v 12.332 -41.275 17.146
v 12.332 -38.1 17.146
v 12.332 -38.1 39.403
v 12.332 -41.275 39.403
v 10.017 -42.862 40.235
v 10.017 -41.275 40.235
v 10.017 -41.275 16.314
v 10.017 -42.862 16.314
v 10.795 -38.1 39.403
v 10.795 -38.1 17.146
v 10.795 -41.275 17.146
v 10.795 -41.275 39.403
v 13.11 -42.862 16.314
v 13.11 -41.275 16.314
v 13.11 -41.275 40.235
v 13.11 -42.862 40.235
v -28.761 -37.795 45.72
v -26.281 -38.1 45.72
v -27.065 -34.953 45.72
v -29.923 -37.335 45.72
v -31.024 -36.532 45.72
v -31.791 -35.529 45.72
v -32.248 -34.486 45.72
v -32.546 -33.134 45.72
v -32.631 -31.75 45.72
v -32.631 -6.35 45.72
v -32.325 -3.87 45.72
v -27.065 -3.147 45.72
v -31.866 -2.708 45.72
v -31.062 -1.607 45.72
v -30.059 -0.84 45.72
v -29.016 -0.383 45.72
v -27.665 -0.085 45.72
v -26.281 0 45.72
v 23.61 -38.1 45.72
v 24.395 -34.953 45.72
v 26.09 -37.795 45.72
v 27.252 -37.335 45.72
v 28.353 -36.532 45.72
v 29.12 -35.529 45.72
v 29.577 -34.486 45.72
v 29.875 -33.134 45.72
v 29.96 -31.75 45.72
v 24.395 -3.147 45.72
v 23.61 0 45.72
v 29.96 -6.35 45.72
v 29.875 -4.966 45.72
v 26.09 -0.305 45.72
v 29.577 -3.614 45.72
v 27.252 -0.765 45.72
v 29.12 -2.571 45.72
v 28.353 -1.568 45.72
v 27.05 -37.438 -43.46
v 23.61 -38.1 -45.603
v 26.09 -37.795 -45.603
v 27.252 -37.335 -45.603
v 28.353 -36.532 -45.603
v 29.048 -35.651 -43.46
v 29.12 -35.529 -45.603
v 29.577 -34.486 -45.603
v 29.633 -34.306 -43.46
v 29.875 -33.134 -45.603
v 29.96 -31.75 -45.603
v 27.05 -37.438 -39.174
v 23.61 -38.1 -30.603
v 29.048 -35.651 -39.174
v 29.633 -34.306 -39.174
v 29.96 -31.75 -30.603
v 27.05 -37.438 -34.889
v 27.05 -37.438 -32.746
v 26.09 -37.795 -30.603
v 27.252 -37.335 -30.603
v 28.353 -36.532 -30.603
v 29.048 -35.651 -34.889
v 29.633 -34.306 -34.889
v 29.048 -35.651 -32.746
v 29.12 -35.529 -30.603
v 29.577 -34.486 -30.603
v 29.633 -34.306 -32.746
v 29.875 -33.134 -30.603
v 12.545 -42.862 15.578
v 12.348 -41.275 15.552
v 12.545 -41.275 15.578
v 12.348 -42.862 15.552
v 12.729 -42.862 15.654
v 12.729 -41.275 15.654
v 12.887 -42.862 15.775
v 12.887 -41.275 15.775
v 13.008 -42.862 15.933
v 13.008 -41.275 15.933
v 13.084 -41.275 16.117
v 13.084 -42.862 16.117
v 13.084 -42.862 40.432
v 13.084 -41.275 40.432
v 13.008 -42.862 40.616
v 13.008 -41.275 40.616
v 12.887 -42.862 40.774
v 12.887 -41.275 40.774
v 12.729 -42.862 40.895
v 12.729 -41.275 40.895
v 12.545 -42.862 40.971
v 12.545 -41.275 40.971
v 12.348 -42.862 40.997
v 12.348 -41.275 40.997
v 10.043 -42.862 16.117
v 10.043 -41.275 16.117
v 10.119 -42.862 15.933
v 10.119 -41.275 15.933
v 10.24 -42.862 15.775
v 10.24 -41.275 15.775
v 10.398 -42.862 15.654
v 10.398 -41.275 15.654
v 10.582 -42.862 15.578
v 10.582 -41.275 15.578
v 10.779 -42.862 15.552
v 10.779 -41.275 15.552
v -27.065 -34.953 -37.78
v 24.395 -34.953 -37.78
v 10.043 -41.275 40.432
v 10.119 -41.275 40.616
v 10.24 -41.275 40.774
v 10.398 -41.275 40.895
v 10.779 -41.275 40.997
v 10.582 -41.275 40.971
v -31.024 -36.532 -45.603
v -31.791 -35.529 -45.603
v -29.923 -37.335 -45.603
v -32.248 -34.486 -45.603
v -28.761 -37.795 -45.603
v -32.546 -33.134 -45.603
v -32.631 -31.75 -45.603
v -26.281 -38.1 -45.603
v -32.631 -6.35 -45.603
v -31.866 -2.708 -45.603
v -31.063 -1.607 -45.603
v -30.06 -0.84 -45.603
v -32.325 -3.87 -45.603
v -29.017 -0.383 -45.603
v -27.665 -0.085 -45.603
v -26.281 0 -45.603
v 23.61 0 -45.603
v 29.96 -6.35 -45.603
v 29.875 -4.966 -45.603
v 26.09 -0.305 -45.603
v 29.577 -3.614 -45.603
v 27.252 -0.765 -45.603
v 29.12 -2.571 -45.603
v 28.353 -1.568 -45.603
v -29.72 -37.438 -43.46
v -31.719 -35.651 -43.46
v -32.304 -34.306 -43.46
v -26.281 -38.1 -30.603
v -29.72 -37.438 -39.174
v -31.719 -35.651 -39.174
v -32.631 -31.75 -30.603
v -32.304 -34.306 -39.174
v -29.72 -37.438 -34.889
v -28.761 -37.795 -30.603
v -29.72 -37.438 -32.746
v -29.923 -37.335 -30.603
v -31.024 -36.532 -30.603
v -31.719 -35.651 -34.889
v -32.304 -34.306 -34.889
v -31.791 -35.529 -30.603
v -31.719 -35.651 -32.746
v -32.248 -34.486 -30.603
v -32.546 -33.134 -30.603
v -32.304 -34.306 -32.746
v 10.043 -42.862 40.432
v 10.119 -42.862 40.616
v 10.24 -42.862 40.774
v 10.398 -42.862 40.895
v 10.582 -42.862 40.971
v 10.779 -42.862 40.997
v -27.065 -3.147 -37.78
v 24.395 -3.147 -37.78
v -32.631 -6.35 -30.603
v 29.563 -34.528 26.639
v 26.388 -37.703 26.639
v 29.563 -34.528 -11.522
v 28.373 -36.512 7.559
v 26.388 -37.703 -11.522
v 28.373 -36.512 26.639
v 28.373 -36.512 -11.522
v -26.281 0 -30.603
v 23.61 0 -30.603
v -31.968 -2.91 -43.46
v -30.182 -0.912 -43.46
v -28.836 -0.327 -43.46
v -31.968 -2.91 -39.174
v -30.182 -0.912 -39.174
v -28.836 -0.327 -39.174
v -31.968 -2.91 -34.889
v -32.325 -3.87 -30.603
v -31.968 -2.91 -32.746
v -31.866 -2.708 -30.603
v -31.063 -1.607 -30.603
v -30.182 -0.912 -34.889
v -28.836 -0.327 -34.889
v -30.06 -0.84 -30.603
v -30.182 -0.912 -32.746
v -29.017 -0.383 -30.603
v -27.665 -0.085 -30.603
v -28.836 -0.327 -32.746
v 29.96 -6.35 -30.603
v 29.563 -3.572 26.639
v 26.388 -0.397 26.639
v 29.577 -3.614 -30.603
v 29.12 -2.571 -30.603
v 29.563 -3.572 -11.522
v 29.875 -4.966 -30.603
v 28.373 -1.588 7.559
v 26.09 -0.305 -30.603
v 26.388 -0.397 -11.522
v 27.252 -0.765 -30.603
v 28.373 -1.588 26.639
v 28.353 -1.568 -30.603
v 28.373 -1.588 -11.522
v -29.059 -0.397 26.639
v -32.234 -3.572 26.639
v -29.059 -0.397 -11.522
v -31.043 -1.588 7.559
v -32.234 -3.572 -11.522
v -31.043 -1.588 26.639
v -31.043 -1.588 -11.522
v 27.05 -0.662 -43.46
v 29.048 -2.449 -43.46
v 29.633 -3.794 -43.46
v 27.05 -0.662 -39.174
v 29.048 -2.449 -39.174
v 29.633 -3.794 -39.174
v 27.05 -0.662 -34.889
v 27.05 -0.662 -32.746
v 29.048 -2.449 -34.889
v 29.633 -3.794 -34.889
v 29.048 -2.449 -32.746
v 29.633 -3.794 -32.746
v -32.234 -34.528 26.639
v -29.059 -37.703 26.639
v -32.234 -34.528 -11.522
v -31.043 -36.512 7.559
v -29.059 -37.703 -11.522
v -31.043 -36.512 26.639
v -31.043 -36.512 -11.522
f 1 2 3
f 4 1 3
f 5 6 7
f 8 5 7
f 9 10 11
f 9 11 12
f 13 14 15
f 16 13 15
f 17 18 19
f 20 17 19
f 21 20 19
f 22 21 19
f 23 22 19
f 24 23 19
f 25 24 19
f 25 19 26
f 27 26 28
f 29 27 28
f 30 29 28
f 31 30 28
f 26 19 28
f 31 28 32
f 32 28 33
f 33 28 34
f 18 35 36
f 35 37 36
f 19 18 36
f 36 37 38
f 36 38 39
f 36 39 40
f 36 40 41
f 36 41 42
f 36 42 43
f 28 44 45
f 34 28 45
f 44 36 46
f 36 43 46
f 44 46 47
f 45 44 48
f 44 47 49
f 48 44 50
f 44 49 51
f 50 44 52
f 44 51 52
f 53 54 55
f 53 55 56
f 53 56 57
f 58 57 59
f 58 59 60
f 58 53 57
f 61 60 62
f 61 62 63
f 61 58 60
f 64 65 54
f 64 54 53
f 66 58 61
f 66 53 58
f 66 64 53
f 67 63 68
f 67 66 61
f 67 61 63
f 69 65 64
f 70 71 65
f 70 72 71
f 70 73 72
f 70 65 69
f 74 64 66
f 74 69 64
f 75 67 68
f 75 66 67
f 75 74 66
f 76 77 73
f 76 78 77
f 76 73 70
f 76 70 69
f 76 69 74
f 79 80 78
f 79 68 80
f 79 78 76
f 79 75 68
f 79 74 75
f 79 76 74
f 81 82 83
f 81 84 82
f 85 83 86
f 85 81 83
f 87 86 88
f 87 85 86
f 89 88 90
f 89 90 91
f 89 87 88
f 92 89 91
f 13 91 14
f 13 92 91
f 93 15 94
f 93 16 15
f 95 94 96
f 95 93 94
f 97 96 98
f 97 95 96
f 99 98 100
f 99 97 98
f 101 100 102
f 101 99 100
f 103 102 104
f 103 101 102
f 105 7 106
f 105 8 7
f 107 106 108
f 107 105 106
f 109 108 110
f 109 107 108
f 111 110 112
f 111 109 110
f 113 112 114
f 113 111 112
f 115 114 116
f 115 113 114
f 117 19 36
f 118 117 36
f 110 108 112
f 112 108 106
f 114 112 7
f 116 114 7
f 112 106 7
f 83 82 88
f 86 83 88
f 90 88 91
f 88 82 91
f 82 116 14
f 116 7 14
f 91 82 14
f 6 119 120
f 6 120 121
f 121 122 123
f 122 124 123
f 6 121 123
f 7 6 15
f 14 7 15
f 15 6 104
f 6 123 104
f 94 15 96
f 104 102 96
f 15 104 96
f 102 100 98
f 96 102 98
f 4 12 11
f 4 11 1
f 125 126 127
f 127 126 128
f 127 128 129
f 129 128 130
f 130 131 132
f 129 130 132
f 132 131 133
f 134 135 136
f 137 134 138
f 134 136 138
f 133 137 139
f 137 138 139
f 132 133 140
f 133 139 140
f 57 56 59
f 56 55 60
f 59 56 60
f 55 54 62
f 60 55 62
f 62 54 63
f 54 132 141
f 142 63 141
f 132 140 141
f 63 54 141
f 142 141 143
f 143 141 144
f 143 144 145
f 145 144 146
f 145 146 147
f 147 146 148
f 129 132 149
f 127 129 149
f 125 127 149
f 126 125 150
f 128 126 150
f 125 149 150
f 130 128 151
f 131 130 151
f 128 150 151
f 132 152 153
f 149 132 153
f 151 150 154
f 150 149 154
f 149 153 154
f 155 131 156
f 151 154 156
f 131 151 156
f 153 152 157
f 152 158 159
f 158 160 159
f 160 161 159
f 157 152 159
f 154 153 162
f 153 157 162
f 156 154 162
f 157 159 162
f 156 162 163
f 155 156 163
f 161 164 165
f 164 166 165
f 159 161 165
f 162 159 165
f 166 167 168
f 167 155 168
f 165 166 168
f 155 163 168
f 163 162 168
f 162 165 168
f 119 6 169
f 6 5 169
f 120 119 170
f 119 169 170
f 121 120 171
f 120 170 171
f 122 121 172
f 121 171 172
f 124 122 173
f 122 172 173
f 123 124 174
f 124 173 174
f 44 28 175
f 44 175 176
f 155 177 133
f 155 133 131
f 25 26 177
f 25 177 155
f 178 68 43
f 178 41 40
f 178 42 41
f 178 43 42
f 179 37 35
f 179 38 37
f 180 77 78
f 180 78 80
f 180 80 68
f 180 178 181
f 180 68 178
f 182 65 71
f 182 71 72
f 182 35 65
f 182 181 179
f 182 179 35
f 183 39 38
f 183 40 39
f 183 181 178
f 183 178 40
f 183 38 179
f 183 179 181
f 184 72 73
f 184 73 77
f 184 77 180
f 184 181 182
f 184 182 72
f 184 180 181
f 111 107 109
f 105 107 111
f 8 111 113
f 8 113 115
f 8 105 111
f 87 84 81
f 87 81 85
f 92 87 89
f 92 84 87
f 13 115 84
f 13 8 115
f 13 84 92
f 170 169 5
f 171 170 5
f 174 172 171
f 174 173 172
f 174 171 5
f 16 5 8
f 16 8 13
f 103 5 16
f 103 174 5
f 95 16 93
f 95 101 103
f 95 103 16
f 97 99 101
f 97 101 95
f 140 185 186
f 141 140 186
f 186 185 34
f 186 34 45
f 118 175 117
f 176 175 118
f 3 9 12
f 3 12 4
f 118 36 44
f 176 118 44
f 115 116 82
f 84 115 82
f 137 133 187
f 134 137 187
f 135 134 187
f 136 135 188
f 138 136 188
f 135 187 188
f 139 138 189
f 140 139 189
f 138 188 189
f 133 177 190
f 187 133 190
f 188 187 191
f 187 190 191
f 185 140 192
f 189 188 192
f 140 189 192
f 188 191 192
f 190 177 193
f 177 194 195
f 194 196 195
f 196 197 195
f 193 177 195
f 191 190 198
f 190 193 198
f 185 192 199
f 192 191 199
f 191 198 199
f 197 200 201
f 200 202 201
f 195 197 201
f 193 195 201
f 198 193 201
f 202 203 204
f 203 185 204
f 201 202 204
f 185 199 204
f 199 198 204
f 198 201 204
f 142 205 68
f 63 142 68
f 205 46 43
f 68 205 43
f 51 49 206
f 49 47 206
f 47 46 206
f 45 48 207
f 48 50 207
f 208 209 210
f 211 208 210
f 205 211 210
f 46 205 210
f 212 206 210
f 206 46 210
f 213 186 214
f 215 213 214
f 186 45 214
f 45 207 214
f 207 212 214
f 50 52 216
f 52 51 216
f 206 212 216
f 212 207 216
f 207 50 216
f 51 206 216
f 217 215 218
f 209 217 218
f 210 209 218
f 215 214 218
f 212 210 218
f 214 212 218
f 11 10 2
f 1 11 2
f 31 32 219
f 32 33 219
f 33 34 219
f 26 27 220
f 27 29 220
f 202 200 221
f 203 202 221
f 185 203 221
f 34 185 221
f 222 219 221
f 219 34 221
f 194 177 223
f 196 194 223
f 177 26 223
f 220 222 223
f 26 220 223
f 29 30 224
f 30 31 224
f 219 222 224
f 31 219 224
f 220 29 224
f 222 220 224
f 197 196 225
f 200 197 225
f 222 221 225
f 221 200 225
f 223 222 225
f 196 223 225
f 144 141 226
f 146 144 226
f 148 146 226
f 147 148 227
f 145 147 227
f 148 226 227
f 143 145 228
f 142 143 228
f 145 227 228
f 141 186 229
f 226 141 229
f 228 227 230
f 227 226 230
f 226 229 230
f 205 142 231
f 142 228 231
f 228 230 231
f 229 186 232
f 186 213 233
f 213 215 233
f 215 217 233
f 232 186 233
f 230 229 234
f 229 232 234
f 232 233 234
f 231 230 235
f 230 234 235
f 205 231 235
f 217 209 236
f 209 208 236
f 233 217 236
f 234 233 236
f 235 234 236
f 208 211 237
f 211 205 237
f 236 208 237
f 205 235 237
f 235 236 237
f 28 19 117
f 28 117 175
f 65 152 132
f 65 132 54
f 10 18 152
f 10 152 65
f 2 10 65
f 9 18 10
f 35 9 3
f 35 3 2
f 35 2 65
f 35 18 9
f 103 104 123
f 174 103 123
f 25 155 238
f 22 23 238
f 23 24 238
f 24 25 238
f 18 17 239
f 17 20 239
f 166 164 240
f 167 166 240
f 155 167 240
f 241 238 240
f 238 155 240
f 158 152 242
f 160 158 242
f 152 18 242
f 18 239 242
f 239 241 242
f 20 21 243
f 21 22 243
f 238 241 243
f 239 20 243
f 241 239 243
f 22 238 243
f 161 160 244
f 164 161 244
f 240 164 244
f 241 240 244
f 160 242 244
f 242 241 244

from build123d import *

# Parameters (mm, degrees)
F0_W         = 82.5909674168
F0_H         = 76.3229075819
F1_DEPTH     = 25.4
F2_DEPTH     = 12.7
F3_W         = 71.4602097869
F3_H         = 31.8052172609
F4_DEPTH     = 63.5
F5_W         = 1.5378370881
F5_H         = 22.2577918321
F6_DEPTH     = 3.175
F8_DEPTH     = 1.5875
F9_R         = 0.762
F10_DEPTH    = 20
F11_DEPTH    = 20
F12_T1_DEPTH = 108.0729075819
F13_DEPTH    = 20
F14_DEPTH    = 20
F15_DEPTH    = 5


# Not quite as in the source:
# - a fillet or chamfer that OpenCascade refuses, or shapes differently, is made with other operations: its cross-section is extruded or revolved along the edge and cut away or added
# - a length typed as a fraction of an inch, garbled in the dataset ("3 / 203.2 mm" for 3/8 in), is restored


with BuildPart() as f1:
    # F0 (on Front) → F1 (new body)
    with BuildSketch(Plane.XZ):
        with Locations((8.6646787822, 7.5585497543)):
            Rectangle(F0_W, F0_H)
    extrude(amount=F1_DEPTH)

    # F2 (add): a face of the model
    f2_faces = [f1.faces().sort_by_distance(p)[0] for p in [
        (8.6646787822, -25.4, 7.5585497543),
    ]]
    extrude(f2_faces, amount=F2_DEPTH)

    # F3 (on face) → F4 (cut)
    with BuildSketch(Plane.XY.offset(45.7200035453)):
        with Locations((8.6646787822, -19.05)):
            Rectangle(F3_W, F3_H)
    extrude(amount=-F4_DEPTH, mode=Mode.SUBTRACT)

    # F5 (on face) → F6 (join)
    with BuildSketch(Plane.XZ.offset(38.1)):
        with Locations((11.5634491667, 28.2745240256)):
            Rectangle(F5_W, F5_H)
    extrude(amount=F6_DEPTH)

    # F10 (add): a face of the model
    f10_faces = [f1.faces().sort_by_distance(p)[0] for p in [
        (44.3947836757, -19.05, 13.9700035453),
    ]]
    extrude(f10_faces, amount=F10_DEPTH)

    # F11 (cut): a face of the model
    f11_faces = [f1.faces().sort_by_distance(p)[0] for p in [
        (49.9601624906, -19.05, 7.5585497543),
    ]]
    extrude(f11_faces, amount=-F11_DEPTH, mode=Mode.SUBTRACT)

    # F12: fillet of radius 6.35 on 4 edges, made by hand

    # F12_s2 → F12_t1 (cut)
    with BuildSketch(Plane.XY.offset(-46.4779040366)):
        with BuildLine():
            add(Edge.make_bspline(
                [(29.9601624906, -6.35), (29.9601624906, 0), (23.6101624906, 0)],
                knots=[0, 0, 0, 1, 1, 1], degree=2, weights=[1, 1, 1]))
            Line((23.6101624906, 0), (29.9601624906, 0))
            Line((29.9601624906, 0), (29.9601624906, -6.35))
        make_face()
        with BuildLine():
            add(Edge.make_bspline(
                [(29.9601624906, -31.75), (29.9601624906, -38.1), (23.6101624906, -38.1)],
                knots=[0, 0, 0, 1, 1, 1], degree=2, weights=[1, 1, 1]))
            Line((23.6101624906, -38.1), (29.9601624906, -38.1))
            Line((29.9601624906, -38.1), (29.9601624906, -31.75))
        make_face()
        with BuildLine():
            add(Edge.make_bspline(
                [(-26.2808049262, 0), (-32.6308049262, 0), (-32.6308049262, -6.35)],
                knots=[0, 0, 0, 1, 1, 1], degree=2, weights=[1, 1, 1]))
            Line((-32.6308049262, -6.35), (-32.6308049262, 0))
            Line((-32.6308049262, 0), (-26.2808049262, 0))
        make_face()
        with BuildLine():
            add(Edge.make_bspline(
                [(-32.6308049262, -31.75), (-32.6308049262, -38.1), (-26.2808049262, -38.1)],
                knots=[0, 0, 0, 1, 1, 1], degree=2, weights=[1, 1, 1]))
            Line((-26.2808049262, -38.1), (-32.6308049262, -38.1))
            Line((-32.6308049262, -38.1), (-32.6308049262, -31.75))
        make_face()
    extrude(amount=F12_T1_DEPTH, mode=Mode.SUBTRACT)

    # F13 (add): a face of the model
    f13_faces = [f1.faces().sort_by_distance(p)[0] for p in [
        (-1.3353212302, -19.0499999912, -30.6029040366),
    ]]
    extrude(f13_faces, amount=F13_DEPTH)

    # F14 (cut): a face of the model
    f14_faces = [f1.faces().sort_by_distance(p)[0] for p in [
        (-1.3353212178, -19.05, -17.7799964547),
    ]]
    extrude(f14_faces, amount=-F14_DEPTH, mode=Mode.SUBTRACT)

    # F15 (cut): a face of the model
    f15_faces = [f1.faces().sort_by_distance(p)[0] for p in [
        (-1.3353212302, -19.0499999912, -50.6029040366),
    ]]
    extrude(f15_faces, amount=-F15_DEPTH, mode=Mode.SUBTRACT)


with BuildPart() as f8:
    # F7 (on face) → F8 (new body)
    with BuildSketch(Plane.XZ.offset(41.275)):
        Polygon((10.0171929225, 40.99727422), (10.0171929225, 39.4034199417), (10.0171929225, 17.1456281096), (10.0171929225, 15.5517738312), (13.1097054109, 15.5517738312), (13.1097054109, 17.1456281096), (13.1097054109, 39.4034199417), (13.1097054109, 40.99727422), align=None)
    extrude(amount=F8_DEPTH)

    # F9
    f9_edges = [f8.edges().sort_by_distance(p)[0] for p in [
        (13.109705, -42.06875, 40.997274),
        (10.017193, -42.06875, 40.997274),
        (13.109705, -42.06875, 15.551774),
        (10.017193, -42.06875, 15.551774),
    ]]
    fillet(f9_edges, radius=F9_R)


solid = Compound([f1.part, f8.part])
